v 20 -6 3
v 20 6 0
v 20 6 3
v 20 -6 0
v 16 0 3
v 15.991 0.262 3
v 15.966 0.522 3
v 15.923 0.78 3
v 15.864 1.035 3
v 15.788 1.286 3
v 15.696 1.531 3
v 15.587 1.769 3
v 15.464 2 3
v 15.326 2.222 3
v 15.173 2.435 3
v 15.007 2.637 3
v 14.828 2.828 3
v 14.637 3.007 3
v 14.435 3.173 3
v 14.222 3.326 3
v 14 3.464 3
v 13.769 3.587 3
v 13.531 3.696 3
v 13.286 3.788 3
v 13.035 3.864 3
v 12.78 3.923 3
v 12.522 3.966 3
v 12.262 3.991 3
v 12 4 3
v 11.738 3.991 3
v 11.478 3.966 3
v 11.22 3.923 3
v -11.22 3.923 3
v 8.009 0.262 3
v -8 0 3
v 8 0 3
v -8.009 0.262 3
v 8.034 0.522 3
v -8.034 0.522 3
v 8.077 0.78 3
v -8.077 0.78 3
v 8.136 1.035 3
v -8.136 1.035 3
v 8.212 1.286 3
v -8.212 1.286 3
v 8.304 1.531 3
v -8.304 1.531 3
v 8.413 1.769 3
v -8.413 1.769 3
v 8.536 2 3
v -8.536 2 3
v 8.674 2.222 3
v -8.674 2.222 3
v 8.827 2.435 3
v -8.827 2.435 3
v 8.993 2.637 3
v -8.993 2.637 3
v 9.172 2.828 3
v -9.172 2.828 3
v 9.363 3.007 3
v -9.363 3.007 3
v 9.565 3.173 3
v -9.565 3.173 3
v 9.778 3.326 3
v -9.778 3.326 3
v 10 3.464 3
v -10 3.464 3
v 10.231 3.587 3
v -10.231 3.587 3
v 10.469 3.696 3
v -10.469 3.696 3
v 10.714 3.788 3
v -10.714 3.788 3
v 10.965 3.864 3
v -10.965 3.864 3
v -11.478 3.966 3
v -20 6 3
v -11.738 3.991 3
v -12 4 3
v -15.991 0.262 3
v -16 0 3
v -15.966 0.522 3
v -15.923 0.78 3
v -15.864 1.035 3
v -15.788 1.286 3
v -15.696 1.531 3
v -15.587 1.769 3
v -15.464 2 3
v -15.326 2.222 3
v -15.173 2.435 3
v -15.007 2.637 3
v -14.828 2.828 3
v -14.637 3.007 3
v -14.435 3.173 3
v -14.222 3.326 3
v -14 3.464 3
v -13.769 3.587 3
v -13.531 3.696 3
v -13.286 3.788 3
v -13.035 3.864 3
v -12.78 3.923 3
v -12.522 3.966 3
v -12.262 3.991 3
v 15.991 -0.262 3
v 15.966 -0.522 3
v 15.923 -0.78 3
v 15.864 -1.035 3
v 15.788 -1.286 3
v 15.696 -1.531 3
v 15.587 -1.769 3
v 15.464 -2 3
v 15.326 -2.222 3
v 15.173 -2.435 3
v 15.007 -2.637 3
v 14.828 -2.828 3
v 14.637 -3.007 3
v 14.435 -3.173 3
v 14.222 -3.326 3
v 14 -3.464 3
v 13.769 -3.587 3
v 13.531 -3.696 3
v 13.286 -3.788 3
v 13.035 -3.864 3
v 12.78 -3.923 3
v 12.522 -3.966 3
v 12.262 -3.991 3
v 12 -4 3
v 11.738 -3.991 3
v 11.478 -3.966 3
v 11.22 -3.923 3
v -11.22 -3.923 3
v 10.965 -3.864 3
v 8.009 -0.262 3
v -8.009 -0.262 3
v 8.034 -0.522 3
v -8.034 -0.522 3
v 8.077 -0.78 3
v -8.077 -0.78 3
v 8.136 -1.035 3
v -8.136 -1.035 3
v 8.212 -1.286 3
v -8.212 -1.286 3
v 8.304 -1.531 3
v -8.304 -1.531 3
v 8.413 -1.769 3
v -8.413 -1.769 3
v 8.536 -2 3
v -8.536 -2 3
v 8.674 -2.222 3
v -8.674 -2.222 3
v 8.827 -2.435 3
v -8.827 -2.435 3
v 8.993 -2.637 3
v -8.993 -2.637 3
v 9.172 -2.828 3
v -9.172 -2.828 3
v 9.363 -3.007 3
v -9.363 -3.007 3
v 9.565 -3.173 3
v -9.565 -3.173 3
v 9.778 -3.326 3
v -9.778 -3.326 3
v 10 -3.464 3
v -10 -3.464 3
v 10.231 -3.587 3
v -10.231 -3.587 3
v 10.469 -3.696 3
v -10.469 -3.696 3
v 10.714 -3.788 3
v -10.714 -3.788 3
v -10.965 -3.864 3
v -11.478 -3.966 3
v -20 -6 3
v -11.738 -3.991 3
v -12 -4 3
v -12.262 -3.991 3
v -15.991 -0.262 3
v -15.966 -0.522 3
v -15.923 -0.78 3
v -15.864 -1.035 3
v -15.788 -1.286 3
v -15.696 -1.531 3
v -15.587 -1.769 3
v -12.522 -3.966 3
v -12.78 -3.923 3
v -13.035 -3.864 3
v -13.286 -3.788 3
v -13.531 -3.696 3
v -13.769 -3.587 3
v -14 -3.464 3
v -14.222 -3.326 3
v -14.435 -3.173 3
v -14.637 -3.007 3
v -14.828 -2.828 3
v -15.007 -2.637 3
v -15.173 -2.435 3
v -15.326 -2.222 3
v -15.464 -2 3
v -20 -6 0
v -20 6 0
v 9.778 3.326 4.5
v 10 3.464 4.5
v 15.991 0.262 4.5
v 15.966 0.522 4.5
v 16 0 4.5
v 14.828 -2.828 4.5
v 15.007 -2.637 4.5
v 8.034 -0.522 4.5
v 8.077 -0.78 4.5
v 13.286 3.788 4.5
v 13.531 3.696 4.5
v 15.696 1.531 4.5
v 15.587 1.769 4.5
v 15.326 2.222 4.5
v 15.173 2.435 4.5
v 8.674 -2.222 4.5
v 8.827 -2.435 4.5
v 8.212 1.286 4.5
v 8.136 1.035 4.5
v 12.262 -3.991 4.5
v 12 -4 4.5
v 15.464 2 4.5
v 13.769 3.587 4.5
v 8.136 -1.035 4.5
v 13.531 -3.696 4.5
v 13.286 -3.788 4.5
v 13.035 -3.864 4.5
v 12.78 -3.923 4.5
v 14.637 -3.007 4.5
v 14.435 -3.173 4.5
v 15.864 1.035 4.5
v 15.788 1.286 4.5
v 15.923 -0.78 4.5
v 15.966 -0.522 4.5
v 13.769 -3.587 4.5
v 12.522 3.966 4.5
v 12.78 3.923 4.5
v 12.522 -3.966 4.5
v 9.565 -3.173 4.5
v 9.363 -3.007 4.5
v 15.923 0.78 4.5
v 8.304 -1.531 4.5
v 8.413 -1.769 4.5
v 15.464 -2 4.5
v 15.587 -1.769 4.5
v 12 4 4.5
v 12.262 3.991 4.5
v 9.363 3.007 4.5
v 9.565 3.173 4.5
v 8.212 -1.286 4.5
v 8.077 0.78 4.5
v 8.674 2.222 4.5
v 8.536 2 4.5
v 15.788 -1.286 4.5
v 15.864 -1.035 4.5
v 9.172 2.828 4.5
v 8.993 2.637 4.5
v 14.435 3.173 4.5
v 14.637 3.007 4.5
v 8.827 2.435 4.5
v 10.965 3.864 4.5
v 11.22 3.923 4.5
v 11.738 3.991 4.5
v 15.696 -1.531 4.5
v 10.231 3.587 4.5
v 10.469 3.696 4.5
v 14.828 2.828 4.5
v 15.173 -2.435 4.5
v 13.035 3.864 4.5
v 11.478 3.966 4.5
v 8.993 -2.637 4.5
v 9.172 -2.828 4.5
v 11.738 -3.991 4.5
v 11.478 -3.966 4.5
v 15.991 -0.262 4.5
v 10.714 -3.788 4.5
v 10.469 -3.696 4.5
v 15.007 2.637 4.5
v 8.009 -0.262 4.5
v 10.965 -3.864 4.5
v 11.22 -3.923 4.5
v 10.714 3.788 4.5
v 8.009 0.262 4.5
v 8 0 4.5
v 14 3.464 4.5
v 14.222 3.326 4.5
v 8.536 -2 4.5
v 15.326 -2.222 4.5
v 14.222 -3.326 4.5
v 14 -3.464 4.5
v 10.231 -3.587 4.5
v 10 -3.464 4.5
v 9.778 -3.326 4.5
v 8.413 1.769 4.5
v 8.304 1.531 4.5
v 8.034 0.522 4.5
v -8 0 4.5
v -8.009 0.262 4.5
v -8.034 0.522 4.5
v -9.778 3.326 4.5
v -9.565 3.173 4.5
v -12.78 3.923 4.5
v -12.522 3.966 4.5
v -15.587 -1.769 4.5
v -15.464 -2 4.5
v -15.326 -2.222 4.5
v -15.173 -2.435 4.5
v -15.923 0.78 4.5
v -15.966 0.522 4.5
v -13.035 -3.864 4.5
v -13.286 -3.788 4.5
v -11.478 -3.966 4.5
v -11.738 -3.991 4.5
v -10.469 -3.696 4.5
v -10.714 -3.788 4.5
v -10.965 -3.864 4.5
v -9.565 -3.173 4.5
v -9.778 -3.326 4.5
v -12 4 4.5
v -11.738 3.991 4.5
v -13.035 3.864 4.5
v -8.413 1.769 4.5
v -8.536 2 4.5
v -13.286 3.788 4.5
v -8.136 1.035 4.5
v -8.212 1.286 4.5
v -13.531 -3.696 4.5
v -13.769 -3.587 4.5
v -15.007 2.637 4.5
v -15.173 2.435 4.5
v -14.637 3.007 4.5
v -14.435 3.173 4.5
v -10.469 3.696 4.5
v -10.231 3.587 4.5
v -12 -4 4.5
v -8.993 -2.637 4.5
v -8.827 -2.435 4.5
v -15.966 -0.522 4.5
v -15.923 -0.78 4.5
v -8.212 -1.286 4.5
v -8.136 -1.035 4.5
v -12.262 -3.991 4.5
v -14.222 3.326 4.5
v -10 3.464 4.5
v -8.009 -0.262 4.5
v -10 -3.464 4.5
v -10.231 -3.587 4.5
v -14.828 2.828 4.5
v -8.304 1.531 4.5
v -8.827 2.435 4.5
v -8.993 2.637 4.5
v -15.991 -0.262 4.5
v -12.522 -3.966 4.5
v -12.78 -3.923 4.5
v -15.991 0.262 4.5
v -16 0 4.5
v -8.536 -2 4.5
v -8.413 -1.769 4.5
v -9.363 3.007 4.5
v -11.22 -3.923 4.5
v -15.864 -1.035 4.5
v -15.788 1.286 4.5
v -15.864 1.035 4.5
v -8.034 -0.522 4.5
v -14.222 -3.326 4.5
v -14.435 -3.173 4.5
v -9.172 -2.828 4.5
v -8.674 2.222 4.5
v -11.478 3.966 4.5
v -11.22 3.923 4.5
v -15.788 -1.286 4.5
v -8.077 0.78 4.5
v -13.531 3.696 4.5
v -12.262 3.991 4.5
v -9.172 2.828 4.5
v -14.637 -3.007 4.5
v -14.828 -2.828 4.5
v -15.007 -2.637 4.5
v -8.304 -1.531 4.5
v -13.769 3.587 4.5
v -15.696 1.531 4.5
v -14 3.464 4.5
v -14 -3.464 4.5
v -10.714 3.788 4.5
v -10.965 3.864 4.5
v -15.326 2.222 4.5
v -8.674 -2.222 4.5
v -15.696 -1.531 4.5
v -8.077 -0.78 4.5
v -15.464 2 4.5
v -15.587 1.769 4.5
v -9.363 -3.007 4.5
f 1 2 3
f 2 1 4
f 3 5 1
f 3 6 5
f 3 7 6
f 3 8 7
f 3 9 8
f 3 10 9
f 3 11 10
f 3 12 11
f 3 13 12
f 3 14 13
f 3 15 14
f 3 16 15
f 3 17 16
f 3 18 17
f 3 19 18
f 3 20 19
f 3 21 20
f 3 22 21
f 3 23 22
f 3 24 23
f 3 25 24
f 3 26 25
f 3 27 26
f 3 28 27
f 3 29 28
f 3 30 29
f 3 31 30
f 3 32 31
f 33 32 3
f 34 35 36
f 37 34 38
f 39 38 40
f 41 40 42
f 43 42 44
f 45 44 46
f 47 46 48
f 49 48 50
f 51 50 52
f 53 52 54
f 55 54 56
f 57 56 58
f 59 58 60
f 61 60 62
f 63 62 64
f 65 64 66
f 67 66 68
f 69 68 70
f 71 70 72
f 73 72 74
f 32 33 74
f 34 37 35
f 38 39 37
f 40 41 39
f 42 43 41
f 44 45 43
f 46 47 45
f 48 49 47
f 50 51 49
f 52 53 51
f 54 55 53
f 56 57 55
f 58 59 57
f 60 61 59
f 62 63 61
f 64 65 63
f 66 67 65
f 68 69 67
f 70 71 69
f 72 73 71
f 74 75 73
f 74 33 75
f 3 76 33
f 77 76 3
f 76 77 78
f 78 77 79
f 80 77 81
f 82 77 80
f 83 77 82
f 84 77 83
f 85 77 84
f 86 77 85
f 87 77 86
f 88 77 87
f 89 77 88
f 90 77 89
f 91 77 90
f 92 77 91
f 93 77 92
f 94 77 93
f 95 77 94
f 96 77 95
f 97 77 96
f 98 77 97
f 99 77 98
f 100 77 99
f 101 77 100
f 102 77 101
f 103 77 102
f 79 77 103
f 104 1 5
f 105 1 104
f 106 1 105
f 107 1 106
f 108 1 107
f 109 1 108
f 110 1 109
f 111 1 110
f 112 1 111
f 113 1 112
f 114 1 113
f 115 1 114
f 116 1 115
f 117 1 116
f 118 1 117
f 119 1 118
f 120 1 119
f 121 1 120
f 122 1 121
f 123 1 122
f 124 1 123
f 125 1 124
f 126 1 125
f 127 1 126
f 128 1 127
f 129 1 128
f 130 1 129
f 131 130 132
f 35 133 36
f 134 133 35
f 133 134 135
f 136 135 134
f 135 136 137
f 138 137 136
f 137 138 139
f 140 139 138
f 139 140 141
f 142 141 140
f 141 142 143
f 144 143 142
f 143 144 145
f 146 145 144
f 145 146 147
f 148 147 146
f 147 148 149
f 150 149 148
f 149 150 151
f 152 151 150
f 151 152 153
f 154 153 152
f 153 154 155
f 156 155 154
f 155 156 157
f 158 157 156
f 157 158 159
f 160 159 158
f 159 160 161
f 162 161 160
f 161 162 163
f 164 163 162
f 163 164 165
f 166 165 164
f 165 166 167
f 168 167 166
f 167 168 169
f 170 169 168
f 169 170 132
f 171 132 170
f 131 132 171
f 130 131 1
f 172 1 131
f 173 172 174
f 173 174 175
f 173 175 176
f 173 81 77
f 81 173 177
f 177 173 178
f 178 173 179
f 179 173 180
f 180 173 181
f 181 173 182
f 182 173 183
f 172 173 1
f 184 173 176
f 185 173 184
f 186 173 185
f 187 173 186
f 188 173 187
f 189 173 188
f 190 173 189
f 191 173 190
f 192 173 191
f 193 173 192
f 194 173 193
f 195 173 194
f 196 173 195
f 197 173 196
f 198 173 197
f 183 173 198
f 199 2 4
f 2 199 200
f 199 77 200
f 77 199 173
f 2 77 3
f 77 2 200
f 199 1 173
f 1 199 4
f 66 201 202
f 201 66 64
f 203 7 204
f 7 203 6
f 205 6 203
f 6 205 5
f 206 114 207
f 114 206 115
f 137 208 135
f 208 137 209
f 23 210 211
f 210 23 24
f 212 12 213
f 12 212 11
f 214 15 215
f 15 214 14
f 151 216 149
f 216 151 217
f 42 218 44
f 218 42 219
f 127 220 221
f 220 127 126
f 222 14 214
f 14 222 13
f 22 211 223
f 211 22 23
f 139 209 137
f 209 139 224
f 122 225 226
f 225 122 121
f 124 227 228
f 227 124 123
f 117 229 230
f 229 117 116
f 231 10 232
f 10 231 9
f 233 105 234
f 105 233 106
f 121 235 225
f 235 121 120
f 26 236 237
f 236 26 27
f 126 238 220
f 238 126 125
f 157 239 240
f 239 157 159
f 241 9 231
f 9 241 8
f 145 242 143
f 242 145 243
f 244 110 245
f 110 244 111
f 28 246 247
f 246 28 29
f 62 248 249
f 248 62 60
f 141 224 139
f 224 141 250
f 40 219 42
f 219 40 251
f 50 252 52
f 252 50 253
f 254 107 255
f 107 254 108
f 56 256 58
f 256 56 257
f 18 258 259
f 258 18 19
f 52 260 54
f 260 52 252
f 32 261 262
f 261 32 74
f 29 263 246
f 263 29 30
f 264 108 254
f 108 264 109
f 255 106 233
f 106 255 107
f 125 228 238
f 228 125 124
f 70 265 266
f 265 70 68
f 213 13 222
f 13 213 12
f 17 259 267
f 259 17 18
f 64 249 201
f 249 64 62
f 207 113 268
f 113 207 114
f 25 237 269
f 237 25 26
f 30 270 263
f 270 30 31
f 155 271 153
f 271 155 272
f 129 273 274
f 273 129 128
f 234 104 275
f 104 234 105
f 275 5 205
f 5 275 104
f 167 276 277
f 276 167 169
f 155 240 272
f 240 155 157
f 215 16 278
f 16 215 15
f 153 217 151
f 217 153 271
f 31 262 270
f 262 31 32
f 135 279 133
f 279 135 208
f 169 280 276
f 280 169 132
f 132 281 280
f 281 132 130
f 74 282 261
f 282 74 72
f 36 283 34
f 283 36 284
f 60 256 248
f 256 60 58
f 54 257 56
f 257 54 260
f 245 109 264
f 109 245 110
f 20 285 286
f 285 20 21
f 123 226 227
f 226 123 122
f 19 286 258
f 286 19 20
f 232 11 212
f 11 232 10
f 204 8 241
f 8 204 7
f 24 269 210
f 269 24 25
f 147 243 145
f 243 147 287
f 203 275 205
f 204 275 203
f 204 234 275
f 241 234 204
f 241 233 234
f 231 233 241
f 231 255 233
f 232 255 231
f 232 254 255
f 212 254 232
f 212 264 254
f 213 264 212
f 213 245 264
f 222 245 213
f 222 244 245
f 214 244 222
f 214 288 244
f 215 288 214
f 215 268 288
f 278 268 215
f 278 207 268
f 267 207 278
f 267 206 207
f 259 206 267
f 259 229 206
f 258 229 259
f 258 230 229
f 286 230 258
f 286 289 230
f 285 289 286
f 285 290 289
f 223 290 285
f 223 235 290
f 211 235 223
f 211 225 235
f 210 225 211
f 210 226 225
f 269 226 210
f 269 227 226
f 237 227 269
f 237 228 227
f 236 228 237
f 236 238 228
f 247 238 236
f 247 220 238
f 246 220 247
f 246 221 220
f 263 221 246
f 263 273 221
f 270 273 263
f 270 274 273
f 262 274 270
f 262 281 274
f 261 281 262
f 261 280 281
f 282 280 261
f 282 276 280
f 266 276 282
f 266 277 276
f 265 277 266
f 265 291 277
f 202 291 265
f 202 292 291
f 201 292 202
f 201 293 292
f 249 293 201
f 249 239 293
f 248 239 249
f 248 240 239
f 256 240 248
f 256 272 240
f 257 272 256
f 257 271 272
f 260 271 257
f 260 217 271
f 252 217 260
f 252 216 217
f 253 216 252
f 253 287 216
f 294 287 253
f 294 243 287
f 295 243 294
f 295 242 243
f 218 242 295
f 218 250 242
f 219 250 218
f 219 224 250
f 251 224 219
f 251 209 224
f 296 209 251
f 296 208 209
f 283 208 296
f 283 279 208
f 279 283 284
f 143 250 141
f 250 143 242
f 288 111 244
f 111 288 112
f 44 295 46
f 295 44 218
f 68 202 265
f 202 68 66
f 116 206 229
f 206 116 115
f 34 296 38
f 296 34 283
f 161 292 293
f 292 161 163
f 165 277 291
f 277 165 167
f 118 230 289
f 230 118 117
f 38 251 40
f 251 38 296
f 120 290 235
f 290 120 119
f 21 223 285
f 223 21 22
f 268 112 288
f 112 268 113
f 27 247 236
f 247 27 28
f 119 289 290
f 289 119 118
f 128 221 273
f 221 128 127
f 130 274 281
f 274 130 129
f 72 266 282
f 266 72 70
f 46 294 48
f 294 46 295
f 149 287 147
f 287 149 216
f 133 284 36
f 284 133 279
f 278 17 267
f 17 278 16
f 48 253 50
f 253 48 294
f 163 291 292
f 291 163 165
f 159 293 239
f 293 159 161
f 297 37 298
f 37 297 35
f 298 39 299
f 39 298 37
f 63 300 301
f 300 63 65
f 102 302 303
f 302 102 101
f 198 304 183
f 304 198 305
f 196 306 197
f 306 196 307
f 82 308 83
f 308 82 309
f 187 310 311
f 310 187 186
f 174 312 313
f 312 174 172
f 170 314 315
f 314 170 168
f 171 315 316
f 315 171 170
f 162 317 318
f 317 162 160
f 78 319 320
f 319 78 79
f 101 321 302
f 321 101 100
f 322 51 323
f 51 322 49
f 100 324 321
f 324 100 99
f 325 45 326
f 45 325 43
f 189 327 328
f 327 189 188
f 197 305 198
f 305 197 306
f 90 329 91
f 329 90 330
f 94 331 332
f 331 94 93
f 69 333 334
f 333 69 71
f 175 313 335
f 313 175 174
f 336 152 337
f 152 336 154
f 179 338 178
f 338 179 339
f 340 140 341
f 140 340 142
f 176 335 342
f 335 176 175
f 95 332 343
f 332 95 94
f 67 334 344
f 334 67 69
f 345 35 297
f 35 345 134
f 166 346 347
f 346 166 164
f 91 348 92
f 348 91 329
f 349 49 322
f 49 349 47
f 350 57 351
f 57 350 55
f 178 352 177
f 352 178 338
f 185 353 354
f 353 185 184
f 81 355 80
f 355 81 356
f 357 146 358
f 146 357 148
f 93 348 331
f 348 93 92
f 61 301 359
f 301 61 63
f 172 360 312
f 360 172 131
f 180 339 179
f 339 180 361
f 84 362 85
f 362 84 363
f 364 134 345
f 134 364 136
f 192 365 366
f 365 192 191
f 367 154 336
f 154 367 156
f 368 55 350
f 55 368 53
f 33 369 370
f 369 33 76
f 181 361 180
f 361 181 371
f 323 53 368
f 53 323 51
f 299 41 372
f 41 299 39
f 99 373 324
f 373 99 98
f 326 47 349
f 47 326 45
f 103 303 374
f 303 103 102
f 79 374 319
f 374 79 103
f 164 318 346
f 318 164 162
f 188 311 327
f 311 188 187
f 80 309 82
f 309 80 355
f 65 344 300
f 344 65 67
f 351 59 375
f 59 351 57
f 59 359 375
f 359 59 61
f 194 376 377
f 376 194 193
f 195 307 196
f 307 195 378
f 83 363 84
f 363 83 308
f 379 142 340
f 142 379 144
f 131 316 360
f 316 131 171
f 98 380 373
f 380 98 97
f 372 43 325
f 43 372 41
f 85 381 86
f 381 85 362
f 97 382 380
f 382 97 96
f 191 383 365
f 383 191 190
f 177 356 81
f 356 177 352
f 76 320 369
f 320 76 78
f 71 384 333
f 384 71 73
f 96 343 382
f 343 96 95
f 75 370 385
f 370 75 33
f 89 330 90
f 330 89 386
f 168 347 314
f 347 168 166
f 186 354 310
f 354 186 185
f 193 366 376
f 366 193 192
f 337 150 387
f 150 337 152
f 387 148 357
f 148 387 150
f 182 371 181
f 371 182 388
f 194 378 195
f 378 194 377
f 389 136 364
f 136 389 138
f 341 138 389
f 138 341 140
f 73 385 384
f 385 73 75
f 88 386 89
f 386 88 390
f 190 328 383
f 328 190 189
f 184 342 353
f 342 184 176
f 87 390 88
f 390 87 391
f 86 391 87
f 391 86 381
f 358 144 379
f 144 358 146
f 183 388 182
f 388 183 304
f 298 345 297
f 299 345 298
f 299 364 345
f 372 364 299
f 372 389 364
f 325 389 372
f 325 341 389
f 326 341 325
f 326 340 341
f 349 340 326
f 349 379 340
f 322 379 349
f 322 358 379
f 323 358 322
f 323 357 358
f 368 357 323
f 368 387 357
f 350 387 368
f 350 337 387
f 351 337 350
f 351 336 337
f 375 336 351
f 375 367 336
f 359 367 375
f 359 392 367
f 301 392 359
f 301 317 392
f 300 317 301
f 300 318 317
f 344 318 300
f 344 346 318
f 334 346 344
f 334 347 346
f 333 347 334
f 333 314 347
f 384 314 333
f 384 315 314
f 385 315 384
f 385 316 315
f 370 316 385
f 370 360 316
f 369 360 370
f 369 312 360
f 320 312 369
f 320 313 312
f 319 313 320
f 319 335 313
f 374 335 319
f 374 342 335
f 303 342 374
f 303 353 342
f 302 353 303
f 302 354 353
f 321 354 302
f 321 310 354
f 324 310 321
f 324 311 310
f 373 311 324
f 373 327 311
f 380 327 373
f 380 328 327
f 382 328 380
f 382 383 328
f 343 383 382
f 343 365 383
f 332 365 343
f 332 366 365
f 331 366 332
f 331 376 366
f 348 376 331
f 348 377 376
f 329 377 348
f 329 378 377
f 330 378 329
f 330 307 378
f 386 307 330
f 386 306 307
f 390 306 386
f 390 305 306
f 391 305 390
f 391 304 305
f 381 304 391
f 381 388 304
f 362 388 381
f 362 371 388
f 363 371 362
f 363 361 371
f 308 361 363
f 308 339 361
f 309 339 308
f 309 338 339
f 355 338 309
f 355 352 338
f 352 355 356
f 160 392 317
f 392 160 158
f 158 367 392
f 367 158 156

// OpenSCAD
// Auto-generated from tests/data/feature_fixtures_manifest.json
// fixture: non_revolve_flat_symmetric
// fixture_type: non_revolve
// description: Wide flat symmetric composite; symmetric but not a revolve, must be rejected.
$fn = 96;

plate = [40.000000, 12.000000, 3.000000];

translate([-plate[0]/2, -plate[1]/2, 0]) cube(plate);
translate([12.000000, 0, 3.000000]) cylinder(h=1.500000, d=8.000000);
translate([-12.000000, 0, 3.000000]) cylinder(h=1.500000, d=8.000000);
